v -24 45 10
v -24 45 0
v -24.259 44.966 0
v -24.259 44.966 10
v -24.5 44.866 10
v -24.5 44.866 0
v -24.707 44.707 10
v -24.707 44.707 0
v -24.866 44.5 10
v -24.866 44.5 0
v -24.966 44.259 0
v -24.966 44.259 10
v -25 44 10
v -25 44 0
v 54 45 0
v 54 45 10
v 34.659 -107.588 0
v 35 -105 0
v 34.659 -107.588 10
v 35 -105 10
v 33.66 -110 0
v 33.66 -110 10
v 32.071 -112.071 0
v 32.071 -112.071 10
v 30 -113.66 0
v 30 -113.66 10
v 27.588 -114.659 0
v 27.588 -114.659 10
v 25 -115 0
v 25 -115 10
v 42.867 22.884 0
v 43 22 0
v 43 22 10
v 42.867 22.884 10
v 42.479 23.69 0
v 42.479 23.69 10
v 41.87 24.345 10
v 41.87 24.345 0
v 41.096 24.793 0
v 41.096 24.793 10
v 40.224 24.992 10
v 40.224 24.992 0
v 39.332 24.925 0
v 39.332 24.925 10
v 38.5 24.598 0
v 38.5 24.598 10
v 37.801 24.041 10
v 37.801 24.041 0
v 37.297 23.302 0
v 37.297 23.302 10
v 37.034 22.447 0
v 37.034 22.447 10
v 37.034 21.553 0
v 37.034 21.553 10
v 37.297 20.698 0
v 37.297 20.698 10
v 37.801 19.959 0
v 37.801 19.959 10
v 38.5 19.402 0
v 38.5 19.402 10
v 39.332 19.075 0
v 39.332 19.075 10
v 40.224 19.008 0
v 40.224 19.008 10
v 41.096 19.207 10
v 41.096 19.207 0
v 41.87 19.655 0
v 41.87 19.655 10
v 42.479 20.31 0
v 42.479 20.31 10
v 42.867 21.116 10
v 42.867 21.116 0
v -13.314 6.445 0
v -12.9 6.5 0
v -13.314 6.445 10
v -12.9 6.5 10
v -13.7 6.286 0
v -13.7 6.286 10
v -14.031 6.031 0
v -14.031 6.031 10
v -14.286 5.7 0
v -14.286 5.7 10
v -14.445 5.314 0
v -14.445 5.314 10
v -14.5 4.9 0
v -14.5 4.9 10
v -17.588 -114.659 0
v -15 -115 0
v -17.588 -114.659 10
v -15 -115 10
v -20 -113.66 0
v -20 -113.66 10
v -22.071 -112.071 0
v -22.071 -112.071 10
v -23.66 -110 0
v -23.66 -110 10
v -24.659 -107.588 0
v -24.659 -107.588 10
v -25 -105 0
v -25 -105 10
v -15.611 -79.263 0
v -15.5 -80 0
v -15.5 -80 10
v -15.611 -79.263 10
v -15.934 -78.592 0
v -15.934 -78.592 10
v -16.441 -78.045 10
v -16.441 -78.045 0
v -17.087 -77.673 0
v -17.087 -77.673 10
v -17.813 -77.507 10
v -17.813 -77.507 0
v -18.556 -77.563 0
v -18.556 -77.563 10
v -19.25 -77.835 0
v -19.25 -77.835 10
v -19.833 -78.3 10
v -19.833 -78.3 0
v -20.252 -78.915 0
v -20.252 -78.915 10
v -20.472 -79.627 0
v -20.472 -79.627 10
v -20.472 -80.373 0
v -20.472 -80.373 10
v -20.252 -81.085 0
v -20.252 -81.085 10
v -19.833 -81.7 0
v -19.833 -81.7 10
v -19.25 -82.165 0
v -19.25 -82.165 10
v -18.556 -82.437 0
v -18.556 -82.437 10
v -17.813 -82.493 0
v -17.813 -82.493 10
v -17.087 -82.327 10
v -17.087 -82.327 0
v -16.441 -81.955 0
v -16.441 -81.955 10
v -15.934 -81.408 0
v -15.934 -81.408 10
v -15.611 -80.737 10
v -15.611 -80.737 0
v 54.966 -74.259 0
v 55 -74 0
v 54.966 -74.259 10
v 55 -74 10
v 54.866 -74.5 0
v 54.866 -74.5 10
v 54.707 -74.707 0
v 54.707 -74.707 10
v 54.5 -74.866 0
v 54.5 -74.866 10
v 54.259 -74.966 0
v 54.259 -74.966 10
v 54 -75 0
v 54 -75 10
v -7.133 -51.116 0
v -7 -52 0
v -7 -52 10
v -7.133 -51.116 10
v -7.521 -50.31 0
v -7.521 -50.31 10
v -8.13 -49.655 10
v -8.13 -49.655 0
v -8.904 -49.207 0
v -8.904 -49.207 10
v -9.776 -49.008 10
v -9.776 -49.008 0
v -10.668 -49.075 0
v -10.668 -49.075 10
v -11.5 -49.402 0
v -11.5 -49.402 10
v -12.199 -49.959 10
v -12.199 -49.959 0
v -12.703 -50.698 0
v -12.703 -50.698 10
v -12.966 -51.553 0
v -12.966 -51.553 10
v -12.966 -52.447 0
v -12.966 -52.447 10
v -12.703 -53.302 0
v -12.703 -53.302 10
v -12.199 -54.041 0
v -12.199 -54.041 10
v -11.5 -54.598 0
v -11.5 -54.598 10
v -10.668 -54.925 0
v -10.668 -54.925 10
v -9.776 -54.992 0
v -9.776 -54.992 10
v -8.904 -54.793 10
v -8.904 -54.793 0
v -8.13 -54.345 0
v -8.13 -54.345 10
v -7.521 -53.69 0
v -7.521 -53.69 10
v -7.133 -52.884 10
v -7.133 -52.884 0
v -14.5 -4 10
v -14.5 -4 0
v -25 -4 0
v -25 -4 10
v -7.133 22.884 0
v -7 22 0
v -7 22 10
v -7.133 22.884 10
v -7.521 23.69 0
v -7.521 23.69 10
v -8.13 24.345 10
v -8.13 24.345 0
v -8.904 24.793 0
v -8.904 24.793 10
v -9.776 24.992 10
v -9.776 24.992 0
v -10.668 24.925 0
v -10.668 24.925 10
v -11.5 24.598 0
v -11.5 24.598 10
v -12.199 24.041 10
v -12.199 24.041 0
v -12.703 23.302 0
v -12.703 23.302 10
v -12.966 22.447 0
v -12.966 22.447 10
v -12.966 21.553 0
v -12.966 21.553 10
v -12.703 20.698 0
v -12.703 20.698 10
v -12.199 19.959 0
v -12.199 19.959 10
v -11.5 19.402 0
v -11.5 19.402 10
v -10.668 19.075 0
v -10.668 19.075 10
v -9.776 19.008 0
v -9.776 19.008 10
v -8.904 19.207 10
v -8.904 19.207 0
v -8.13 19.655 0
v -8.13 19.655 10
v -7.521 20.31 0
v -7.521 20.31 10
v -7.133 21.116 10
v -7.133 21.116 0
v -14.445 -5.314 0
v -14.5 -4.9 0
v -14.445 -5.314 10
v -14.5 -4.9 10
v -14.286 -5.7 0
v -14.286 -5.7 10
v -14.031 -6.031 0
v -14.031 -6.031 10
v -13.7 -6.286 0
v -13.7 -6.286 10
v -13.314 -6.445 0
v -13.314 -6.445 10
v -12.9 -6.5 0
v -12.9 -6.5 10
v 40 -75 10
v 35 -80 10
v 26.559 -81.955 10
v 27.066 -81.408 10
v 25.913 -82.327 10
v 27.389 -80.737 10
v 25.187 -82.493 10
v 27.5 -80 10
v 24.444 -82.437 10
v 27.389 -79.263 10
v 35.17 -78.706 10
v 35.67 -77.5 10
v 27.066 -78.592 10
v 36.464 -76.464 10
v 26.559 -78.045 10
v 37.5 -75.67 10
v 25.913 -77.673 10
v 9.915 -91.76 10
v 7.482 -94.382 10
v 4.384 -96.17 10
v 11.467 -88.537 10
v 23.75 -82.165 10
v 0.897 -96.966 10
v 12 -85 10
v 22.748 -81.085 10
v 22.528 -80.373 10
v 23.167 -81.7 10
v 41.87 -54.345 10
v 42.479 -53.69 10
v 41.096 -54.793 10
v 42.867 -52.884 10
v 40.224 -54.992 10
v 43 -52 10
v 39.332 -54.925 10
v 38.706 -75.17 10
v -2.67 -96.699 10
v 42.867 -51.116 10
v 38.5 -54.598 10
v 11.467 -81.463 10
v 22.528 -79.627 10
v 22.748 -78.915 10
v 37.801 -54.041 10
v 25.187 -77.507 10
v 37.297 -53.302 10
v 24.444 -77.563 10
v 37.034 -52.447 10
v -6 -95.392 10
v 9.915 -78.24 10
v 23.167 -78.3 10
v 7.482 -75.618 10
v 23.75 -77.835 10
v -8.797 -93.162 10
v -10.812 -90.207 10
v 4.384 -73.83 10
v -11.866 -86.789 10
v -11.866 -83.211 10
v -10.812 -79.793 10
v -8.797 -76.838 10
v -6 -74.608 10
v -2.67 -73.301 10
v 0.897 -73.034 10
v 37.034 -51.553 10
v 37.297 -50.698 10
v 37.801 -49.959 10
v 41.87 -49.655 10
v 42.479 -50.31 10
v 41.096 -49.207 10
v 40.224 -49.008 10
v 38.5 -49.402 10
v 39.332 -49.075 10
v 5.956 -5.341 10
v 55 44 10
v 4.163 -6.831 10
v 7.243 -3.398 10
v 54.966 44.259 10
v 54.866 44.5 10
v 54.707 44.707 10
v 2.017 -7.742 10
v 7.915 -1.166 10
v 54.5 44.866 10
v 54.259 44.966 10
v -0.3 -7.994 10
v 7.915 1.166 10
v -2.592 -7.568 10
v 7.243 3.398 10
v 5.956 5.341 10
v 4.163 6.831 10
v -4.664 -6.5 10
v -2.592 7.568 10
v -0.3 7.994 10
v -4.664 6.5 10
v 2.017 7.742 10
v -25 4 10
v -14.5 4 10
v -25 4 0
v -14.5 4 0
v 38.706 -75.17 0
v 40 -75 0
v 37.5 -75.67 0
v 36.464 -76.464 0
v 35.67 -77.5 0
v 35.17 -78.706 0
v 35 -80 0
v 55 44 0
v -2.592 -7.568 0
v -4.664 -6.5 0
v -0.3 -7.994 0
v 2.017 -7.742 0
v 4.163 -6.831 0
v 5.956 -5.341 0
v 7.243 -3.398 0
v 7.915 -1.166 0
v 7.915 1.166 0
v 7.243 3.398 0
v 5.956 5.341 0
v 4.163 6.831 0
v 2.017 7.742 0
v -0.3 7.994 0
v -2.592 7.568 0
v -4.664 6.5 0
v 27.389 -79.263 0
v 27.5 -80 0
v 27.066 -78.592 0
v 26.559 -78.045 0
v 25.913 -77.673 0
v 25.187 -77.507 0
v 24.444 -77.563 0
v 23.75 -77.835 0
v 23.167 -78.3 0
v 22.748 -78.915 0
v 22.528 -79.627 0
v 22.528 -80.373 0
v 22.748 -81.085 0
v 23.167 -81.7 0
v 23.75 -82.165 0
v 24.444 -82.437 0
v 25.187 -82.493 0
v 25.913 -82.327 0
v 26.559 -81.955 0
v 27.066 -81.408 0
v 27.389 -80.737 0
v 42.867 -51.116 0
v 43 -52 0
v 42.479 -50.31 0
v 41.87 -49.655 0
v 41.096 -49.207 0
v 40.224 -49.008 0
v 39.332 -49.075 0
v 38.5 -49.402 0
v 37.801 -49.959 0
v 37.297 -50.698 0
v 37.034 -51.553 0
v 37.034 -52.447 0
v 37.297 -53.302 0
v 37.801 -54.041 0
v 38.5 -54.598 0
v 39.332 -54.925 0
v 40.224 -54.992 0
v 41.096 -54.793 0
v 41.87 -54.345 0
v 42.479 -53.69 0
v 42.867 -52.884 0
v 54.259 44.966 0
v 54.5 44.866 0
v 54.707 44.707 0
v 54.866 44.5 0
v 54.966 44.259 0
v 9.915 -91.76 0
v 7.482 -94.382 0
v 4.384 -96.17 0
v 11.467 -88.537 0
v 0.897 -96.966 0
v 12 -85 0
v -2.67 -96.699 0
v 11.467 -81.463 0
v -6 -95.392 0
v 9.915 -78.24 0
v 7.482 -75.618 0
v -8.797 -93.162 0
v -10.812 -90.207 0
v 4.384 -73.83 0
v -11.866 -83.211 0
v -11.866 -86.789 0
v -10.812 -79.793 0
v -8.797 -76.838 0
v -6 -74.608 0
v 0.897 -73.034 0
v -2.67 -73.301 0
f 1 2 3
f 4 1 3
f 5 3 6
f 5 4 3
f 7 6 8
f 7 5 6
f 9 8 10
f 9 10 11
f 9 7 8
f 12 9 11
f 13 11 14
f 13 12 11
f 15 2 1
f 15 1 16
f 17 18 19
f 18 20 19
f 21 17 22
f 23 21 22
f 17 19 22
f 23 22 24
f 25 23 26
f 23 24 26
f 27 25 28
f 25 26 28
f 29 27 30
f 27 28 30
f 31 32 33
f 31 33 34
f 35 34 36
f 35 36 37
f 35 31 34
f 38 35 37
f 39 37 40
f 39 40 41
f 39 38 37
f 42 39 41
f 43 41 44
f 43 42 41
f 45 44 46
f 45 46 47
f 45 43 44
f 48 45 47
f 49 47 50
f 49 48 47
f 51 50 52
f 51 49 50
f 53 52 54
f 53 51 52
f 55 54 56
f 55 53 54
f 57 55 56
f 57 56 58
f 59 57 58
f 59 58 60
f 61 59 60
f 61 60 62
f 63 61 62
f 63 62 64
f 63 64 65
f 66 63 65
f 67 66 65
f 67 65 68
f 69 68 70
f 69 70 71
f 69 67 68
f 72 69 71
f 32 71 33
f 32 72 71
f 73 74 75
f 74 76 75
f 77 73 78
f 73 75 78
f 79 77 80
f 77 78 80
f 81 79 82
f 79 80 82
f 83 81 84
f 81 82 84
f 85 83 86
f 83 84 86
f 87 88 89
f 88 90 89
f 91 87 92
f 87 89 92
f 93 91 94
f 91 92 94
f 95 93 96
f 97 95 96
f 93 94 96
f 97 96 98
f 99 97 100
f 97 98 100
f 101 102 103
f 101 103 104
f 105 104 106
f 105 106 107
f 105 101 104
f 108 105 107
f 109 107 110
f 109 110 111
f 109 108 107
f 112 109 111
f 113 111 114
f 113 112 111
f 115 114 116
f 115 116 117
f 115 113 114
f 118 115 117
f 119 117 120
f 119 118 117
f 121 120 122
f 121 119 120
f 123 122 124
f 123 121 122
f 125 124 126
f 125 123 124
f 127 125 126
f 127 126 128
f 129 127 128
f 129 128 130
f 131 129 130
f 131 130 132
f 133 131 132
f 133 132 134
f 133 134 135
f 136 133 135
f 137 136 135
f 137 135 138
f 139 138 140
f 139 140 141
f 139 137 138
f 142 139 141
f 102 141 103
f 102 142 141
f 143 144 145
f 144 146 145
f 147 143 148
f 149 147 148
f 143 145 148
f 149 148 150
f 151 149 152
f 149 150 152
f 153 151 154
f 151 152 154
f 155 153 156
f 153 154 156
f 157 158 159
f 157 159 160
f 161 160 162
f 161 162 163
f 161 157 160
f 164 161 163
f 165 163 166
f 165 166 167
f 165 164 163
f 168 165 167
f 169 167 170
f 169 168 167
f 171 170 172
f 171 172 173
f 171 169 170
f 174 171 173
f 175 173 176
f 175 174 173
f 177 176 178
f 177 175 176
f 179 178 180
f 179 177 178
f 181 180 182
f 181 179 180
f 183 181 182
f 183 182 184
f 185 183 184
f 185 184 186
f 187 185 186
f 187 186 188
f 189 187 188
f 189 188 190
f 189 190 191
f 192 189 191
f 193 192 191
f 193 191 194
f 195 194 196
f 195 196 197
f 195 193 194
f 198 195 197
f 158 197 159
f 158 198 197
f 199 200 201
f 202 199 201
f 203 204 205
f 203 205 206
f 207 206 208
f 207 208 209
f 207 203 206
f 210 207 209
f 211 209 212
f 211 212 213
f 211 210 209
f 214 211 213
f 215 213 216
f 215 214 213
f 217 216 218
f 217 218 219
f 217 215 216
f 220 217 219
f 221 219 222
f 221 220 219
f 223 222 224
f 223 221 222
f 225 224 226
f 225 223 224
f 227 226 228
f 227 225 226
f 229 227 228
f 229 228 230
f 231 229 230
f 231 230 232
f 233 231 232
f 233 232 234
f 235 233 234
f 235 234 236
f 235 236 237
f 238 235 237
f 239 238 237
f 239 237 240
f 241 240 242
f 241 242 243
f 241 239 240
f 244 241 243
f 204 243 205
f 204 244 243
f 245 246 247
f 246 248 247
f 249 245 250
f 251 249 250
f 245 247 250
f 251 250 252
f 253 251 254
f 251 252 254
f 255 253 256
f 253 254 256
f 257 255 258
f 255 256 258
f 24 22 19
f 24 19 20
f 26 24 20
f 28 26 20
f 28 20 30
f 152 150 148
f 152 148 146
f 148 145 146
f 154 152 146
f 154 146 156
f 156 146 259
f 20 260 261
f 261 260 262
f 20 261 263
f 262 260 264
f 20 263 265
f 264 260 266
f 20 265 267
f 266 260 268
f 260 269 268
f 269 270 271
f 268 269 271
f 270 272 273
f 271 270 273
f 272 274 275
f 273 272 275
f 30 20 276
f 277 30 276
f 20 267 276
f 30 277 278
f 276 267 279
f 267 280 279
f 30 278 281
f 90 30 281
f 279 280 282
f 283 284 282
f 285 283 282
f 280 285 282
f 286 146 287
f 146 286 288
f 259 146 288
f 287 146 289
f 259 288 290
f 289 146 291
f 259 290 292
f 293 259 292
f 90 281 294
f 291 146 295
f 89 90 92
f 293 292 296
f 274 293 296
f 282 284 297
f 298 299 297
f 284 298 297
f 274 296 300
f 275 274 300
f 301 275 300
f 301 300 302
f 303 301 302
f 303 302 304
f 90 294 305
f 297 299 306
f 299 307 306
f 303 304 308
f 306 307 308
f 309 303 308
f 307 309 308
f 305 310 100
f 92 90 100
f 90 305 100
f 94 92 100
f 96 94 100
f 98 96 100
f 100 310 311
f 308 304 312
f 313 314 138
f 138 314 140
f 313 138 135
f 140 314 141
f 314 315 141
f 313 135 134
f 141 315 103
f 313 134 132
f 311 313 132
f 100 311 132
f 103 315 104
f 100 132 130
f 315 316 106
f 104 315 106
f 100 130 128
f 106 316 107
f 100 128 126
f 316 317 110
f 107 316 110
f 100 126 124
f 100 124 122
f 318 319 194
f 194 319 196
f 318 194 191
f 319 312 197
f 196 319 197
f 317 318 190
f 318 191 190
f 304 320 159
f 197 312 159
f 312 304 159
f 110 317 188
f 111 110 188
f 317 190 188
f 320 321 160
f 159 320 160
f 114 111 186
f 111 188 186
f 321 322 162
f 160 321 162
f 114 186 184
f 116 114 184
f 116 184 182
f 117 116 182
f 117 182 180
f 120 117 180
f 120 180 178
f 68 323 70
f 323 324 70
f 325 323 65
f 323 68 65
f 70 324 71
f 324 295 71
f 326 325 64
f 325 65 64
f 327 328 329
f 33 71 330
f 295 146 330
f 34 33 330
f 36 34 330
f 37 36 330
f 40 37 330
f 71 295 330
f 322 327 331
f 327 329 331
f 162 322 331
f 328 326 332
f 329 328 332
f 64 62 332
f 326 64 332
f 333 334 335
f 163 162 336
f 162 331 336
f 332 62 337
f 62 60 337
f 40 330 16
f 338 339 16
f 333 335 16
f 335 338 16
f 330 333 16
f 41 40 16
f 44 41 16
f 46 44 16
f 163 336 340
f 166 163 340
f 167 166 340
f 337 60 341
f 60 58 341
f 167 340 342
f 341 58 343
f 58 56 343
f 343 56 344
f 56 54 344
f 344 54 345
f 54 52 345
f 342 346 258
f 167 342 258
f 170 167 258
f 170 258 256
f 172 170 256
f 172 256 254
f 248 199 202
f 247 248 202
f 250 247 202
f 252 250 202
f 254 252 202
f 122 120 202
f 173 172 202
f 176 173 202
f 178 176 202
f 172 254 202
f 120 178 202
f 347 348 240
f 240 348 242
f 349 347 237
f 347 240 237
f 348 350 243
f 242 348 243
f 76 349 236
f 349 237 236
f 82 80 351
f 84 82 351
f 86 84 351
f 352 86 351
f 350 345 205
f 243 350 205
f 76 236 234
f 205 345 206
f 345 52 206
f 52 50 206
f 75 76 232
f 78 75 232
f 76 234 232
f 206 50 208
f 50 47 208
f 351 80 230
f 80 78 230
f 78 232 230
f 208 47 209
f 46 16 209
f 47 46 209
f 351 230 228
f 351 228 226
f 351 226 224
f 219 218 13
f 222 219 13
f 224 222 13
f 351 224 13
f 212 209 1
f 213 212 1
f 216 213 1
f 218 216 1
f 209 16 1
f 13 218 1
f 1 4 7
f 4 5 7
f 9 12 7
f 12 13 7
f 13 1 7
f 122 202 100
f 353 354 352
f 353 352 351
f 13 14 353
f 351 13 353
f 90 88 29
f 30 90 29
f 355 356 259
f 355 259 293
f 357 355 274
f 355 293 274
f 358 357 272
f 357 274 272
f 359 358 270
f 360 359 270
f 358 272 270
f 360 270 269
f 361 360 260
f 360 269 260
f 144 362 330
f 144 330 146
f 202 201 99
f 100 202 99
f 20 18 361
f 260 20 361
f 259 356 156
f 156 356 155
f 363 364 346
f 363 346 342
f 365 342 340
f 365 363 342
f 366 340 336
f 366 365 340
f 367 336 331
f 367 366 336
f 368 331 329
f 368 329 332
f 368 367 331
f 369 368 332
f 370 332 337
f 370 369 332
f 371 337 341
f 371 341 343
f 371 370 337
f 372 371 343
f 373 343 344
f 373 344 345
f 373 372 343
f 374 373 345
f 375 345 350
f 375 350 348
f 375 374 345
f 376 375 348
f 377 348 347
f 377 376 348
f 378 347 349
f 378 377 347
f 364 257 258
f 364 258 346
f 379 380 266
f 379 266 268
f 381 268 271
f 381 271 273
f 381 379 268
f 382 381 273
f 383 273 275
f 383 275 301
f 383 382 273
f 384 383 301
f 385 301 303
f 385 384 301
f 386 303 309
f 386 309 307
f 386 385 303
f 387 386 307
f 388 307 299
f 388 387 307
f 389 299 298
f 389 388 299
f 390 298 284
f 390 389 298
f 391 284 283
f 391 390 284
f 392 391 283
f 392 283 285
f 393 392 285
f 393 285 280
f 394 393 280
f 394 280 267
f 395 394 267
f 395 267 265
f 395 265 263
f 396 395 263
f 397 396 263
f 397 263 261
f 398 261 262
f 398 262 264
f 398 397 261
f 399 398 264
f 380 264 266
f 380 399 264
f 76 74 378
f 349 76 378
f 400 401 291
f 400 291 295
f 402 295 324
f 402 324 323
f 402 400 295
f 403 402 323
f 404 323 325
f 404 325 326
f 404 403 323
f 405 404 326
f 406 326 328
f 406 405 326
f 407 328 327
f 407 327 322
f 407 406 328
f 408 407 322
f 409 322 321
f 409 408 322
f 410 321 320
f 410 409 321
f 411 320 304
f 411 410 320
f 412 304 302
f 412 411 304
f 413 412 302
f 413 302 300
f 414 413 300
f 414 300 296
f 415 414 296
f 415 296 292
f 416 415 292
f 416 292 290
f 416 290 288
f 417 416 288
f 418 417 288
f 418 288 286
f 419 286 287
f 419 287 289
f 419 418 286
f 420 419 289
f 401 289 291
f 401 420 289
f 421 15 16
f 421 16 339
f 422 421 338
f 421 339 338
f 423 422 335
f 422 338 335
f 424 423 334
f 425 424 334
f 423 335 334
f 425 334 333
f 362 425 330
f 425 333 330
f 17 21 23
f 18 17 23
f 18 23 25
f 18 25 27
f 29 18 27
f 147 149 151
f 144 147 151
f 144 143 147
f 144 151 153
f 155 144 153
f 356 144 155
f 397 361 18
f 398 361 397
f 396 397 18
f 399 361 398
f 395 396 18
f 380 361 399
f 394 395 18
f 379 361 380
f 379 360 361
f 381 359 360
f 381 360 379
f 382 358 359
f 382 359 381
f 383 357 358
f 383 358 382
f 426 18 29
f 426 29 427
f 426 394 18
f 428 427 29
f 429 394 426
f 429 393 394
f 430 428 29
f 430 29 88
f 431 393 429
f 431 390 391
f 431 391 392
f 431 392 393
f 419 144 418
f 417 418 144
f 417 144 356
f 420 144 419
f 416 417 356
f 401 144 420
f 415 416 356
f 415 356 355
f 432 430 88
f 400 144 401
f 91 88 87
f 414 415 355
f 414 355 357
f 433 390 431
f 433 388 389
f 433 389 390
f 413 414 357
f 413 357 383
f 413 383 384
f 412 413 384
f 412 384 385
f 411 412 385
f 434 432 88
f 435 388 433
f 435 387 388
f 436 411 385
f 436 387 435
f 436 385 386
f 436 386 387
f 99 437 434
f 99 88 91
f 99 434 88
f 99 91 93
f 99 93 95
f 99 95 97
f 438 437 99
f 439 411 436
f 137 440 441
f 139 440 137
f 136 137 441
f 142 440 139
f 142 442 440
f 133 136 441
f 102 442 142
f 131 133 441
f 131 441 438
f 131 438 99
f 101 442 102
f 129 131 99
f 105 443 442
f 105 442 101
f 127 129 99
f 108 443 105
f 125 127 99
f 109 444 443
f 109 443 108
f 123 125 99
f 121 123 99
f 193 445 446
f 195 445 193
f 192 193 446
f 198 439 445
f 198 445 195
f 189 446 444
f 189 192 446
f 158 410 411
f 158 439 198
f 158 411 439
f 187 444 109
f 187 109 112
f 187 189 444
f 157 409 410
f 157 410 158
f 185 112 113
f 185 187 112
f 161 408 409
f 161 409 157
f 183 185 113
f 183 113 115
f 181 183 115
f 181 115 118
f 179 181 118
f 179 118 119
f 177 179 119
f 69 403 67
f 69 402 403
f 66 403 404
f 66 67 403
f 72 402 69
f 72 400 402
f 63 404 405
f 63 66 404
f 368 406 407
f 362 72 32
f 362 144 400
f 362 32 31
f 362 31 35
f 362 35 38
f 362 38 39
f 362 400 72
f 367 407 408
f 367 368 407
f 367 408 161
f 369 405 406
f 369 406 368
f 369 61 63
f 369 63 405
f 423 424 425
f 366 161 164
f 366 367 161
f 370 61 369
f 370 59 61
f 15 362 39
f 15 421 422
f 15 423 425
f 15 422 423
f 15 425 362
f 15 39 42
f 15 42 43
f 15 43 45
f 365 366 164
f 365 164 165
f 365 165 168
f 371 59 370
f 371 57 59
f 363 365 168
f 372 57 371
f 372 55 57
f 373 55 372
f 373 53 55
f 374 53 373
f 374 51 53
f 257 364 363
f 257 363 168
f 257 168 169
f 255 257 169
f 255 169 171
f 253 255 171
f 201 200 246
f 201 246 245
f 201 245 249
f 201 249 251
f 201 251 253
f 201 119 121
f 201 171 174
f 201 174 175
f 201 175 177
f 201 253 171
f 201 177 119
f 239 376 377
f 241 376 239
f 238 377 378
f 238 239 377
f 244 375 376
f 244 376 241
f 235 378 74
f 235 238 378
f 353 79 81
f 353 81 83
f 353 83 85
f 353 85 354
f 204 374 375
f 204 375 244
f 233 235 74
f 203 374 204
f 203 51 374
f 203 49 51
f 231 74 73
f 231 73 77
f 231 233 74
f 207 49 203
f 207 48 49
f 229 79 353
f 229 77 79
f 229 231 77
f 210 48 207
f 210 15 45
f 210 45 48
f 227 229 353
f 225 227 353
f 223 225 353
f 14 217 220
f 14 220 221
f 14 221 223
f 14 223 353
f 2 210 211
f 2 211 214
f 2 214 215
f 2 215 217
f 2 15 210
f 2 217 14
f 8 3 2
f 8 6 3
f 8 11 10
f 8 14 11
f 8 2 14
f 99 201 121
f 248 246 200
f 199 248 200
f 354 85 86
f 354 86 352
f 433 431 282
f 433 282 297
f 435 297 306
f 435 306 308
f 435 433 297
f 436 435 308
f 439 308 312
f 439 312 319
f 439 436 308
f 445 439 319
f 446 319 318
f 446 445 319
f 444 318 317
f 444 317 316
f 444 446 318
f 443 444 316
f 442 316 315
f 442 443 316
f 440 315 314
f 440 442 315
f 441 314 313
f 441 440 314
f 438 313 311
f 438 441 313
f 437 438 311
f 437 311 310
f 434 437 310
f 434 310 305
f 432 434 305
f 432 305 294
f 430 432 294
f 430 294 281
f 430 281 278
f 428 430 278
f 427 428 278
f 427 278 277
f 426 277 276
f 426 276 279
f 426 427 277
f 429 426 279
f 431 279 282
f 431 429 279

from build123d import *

# Parameters (mm, degrees)
SKETCH_R    = 3
SKETCH_R_2  = 2.5
SKETCH_R_3  = 12
PAD_DEPTH   = 10
FILLET_R    = 1
FILLET001_R = 5
FILLET002_R = 10
FILLET003_R = 1.6


with BuildPart() as part:
    # Sketch → Pad (new body)
    with BuildSketch(Plane.XY):
        with BuildLine():
            Line((-25, 45), (55, 45))
            Line((55, 45), (55, -75))
            Line((35, -75), (55, -75))
            Line((35, -115), (35, -75))
            Line((-25, -115), (35, -115))
            Line((-25, -4), (-25, -115))
            Line((-14.5, -4), (-25, -4))
            Line((-14.5, -6.5), (-14.5, -4))
            Line((-14.5, -6.5), (-4.66369, -6.5))
            ThreePointArc((-4.66369, -6.5), (8, 0), (-4.66369, 6.5))
            Line((-14.5, 6.5), (-4.66369, 6.5))
            Line((-14.5, 6.5), (-14.5, 4))
            Line((-14.5, 4), (-25, 4))
            Line((-25, 45), (-25, 4))
        make_face()
        with Locations((-10, -52)):
            Circle(SKETCH_R, mode=Mode.SUBTRACT)
        with Locations((40, -52)):
            Circle(SKETCH_R, mode=Mode.SUBTRACT)
        with Locations((40, 22)):
            Circle(SKETCH_R, mode=Mode.SUBTRACT)
        with Locations((-10, 22)):
            Circle(SKETCH_R, mode=Mode.SUBTRACT)
        with Locations((25, -80)):
            Circle(SKETCH_R_2, mode=Mode.SUBTRACT)
        with Locations((-18, -80)):
            Circle(SKETCH_R_2, mode=Mode.SUBTRACT)
        with Locations((0, -85)):
            Circle(SKETCH_R_3, mode=Mode.SUBTRACT)
    extrude(amount=PAD_DEPTH)

    # Fillet
    fillet_edges = [part.edges().sort_by_distance(p)[0] for p in [
        (55, -75, 5),
        (55, 45, 5),
        (-25, 45, 5),
    ]]
    fillet(fillet_edges, radius=FILLET_R)

    # Fillet001
    fillet001_edges = [part.edges().sort_by_distance(p)[0] for p in [
        (35, -75, 5),
    ]]
    fillet(fillet001_edges, radius=FILLET001_R)

    # Fillet002
    fillet002_edges = [part.edges().sort_by_distance(p)[0] for p in [
        (35, -115, 5),
        (-25, -115, 5),
    ]]
    fillet(fillet002_edges, radius=FILLET002_R)

    # Fillet003
    fillet003_edges = [part.edges().sort_by_distance(p)[0] for p in [
        (-14.5, 6.5, 5),
        (-14.5, -6.5, 5),
    ]]
    fillet(fillet003_edges, radius=FILLET003_R)


solid = part.part
